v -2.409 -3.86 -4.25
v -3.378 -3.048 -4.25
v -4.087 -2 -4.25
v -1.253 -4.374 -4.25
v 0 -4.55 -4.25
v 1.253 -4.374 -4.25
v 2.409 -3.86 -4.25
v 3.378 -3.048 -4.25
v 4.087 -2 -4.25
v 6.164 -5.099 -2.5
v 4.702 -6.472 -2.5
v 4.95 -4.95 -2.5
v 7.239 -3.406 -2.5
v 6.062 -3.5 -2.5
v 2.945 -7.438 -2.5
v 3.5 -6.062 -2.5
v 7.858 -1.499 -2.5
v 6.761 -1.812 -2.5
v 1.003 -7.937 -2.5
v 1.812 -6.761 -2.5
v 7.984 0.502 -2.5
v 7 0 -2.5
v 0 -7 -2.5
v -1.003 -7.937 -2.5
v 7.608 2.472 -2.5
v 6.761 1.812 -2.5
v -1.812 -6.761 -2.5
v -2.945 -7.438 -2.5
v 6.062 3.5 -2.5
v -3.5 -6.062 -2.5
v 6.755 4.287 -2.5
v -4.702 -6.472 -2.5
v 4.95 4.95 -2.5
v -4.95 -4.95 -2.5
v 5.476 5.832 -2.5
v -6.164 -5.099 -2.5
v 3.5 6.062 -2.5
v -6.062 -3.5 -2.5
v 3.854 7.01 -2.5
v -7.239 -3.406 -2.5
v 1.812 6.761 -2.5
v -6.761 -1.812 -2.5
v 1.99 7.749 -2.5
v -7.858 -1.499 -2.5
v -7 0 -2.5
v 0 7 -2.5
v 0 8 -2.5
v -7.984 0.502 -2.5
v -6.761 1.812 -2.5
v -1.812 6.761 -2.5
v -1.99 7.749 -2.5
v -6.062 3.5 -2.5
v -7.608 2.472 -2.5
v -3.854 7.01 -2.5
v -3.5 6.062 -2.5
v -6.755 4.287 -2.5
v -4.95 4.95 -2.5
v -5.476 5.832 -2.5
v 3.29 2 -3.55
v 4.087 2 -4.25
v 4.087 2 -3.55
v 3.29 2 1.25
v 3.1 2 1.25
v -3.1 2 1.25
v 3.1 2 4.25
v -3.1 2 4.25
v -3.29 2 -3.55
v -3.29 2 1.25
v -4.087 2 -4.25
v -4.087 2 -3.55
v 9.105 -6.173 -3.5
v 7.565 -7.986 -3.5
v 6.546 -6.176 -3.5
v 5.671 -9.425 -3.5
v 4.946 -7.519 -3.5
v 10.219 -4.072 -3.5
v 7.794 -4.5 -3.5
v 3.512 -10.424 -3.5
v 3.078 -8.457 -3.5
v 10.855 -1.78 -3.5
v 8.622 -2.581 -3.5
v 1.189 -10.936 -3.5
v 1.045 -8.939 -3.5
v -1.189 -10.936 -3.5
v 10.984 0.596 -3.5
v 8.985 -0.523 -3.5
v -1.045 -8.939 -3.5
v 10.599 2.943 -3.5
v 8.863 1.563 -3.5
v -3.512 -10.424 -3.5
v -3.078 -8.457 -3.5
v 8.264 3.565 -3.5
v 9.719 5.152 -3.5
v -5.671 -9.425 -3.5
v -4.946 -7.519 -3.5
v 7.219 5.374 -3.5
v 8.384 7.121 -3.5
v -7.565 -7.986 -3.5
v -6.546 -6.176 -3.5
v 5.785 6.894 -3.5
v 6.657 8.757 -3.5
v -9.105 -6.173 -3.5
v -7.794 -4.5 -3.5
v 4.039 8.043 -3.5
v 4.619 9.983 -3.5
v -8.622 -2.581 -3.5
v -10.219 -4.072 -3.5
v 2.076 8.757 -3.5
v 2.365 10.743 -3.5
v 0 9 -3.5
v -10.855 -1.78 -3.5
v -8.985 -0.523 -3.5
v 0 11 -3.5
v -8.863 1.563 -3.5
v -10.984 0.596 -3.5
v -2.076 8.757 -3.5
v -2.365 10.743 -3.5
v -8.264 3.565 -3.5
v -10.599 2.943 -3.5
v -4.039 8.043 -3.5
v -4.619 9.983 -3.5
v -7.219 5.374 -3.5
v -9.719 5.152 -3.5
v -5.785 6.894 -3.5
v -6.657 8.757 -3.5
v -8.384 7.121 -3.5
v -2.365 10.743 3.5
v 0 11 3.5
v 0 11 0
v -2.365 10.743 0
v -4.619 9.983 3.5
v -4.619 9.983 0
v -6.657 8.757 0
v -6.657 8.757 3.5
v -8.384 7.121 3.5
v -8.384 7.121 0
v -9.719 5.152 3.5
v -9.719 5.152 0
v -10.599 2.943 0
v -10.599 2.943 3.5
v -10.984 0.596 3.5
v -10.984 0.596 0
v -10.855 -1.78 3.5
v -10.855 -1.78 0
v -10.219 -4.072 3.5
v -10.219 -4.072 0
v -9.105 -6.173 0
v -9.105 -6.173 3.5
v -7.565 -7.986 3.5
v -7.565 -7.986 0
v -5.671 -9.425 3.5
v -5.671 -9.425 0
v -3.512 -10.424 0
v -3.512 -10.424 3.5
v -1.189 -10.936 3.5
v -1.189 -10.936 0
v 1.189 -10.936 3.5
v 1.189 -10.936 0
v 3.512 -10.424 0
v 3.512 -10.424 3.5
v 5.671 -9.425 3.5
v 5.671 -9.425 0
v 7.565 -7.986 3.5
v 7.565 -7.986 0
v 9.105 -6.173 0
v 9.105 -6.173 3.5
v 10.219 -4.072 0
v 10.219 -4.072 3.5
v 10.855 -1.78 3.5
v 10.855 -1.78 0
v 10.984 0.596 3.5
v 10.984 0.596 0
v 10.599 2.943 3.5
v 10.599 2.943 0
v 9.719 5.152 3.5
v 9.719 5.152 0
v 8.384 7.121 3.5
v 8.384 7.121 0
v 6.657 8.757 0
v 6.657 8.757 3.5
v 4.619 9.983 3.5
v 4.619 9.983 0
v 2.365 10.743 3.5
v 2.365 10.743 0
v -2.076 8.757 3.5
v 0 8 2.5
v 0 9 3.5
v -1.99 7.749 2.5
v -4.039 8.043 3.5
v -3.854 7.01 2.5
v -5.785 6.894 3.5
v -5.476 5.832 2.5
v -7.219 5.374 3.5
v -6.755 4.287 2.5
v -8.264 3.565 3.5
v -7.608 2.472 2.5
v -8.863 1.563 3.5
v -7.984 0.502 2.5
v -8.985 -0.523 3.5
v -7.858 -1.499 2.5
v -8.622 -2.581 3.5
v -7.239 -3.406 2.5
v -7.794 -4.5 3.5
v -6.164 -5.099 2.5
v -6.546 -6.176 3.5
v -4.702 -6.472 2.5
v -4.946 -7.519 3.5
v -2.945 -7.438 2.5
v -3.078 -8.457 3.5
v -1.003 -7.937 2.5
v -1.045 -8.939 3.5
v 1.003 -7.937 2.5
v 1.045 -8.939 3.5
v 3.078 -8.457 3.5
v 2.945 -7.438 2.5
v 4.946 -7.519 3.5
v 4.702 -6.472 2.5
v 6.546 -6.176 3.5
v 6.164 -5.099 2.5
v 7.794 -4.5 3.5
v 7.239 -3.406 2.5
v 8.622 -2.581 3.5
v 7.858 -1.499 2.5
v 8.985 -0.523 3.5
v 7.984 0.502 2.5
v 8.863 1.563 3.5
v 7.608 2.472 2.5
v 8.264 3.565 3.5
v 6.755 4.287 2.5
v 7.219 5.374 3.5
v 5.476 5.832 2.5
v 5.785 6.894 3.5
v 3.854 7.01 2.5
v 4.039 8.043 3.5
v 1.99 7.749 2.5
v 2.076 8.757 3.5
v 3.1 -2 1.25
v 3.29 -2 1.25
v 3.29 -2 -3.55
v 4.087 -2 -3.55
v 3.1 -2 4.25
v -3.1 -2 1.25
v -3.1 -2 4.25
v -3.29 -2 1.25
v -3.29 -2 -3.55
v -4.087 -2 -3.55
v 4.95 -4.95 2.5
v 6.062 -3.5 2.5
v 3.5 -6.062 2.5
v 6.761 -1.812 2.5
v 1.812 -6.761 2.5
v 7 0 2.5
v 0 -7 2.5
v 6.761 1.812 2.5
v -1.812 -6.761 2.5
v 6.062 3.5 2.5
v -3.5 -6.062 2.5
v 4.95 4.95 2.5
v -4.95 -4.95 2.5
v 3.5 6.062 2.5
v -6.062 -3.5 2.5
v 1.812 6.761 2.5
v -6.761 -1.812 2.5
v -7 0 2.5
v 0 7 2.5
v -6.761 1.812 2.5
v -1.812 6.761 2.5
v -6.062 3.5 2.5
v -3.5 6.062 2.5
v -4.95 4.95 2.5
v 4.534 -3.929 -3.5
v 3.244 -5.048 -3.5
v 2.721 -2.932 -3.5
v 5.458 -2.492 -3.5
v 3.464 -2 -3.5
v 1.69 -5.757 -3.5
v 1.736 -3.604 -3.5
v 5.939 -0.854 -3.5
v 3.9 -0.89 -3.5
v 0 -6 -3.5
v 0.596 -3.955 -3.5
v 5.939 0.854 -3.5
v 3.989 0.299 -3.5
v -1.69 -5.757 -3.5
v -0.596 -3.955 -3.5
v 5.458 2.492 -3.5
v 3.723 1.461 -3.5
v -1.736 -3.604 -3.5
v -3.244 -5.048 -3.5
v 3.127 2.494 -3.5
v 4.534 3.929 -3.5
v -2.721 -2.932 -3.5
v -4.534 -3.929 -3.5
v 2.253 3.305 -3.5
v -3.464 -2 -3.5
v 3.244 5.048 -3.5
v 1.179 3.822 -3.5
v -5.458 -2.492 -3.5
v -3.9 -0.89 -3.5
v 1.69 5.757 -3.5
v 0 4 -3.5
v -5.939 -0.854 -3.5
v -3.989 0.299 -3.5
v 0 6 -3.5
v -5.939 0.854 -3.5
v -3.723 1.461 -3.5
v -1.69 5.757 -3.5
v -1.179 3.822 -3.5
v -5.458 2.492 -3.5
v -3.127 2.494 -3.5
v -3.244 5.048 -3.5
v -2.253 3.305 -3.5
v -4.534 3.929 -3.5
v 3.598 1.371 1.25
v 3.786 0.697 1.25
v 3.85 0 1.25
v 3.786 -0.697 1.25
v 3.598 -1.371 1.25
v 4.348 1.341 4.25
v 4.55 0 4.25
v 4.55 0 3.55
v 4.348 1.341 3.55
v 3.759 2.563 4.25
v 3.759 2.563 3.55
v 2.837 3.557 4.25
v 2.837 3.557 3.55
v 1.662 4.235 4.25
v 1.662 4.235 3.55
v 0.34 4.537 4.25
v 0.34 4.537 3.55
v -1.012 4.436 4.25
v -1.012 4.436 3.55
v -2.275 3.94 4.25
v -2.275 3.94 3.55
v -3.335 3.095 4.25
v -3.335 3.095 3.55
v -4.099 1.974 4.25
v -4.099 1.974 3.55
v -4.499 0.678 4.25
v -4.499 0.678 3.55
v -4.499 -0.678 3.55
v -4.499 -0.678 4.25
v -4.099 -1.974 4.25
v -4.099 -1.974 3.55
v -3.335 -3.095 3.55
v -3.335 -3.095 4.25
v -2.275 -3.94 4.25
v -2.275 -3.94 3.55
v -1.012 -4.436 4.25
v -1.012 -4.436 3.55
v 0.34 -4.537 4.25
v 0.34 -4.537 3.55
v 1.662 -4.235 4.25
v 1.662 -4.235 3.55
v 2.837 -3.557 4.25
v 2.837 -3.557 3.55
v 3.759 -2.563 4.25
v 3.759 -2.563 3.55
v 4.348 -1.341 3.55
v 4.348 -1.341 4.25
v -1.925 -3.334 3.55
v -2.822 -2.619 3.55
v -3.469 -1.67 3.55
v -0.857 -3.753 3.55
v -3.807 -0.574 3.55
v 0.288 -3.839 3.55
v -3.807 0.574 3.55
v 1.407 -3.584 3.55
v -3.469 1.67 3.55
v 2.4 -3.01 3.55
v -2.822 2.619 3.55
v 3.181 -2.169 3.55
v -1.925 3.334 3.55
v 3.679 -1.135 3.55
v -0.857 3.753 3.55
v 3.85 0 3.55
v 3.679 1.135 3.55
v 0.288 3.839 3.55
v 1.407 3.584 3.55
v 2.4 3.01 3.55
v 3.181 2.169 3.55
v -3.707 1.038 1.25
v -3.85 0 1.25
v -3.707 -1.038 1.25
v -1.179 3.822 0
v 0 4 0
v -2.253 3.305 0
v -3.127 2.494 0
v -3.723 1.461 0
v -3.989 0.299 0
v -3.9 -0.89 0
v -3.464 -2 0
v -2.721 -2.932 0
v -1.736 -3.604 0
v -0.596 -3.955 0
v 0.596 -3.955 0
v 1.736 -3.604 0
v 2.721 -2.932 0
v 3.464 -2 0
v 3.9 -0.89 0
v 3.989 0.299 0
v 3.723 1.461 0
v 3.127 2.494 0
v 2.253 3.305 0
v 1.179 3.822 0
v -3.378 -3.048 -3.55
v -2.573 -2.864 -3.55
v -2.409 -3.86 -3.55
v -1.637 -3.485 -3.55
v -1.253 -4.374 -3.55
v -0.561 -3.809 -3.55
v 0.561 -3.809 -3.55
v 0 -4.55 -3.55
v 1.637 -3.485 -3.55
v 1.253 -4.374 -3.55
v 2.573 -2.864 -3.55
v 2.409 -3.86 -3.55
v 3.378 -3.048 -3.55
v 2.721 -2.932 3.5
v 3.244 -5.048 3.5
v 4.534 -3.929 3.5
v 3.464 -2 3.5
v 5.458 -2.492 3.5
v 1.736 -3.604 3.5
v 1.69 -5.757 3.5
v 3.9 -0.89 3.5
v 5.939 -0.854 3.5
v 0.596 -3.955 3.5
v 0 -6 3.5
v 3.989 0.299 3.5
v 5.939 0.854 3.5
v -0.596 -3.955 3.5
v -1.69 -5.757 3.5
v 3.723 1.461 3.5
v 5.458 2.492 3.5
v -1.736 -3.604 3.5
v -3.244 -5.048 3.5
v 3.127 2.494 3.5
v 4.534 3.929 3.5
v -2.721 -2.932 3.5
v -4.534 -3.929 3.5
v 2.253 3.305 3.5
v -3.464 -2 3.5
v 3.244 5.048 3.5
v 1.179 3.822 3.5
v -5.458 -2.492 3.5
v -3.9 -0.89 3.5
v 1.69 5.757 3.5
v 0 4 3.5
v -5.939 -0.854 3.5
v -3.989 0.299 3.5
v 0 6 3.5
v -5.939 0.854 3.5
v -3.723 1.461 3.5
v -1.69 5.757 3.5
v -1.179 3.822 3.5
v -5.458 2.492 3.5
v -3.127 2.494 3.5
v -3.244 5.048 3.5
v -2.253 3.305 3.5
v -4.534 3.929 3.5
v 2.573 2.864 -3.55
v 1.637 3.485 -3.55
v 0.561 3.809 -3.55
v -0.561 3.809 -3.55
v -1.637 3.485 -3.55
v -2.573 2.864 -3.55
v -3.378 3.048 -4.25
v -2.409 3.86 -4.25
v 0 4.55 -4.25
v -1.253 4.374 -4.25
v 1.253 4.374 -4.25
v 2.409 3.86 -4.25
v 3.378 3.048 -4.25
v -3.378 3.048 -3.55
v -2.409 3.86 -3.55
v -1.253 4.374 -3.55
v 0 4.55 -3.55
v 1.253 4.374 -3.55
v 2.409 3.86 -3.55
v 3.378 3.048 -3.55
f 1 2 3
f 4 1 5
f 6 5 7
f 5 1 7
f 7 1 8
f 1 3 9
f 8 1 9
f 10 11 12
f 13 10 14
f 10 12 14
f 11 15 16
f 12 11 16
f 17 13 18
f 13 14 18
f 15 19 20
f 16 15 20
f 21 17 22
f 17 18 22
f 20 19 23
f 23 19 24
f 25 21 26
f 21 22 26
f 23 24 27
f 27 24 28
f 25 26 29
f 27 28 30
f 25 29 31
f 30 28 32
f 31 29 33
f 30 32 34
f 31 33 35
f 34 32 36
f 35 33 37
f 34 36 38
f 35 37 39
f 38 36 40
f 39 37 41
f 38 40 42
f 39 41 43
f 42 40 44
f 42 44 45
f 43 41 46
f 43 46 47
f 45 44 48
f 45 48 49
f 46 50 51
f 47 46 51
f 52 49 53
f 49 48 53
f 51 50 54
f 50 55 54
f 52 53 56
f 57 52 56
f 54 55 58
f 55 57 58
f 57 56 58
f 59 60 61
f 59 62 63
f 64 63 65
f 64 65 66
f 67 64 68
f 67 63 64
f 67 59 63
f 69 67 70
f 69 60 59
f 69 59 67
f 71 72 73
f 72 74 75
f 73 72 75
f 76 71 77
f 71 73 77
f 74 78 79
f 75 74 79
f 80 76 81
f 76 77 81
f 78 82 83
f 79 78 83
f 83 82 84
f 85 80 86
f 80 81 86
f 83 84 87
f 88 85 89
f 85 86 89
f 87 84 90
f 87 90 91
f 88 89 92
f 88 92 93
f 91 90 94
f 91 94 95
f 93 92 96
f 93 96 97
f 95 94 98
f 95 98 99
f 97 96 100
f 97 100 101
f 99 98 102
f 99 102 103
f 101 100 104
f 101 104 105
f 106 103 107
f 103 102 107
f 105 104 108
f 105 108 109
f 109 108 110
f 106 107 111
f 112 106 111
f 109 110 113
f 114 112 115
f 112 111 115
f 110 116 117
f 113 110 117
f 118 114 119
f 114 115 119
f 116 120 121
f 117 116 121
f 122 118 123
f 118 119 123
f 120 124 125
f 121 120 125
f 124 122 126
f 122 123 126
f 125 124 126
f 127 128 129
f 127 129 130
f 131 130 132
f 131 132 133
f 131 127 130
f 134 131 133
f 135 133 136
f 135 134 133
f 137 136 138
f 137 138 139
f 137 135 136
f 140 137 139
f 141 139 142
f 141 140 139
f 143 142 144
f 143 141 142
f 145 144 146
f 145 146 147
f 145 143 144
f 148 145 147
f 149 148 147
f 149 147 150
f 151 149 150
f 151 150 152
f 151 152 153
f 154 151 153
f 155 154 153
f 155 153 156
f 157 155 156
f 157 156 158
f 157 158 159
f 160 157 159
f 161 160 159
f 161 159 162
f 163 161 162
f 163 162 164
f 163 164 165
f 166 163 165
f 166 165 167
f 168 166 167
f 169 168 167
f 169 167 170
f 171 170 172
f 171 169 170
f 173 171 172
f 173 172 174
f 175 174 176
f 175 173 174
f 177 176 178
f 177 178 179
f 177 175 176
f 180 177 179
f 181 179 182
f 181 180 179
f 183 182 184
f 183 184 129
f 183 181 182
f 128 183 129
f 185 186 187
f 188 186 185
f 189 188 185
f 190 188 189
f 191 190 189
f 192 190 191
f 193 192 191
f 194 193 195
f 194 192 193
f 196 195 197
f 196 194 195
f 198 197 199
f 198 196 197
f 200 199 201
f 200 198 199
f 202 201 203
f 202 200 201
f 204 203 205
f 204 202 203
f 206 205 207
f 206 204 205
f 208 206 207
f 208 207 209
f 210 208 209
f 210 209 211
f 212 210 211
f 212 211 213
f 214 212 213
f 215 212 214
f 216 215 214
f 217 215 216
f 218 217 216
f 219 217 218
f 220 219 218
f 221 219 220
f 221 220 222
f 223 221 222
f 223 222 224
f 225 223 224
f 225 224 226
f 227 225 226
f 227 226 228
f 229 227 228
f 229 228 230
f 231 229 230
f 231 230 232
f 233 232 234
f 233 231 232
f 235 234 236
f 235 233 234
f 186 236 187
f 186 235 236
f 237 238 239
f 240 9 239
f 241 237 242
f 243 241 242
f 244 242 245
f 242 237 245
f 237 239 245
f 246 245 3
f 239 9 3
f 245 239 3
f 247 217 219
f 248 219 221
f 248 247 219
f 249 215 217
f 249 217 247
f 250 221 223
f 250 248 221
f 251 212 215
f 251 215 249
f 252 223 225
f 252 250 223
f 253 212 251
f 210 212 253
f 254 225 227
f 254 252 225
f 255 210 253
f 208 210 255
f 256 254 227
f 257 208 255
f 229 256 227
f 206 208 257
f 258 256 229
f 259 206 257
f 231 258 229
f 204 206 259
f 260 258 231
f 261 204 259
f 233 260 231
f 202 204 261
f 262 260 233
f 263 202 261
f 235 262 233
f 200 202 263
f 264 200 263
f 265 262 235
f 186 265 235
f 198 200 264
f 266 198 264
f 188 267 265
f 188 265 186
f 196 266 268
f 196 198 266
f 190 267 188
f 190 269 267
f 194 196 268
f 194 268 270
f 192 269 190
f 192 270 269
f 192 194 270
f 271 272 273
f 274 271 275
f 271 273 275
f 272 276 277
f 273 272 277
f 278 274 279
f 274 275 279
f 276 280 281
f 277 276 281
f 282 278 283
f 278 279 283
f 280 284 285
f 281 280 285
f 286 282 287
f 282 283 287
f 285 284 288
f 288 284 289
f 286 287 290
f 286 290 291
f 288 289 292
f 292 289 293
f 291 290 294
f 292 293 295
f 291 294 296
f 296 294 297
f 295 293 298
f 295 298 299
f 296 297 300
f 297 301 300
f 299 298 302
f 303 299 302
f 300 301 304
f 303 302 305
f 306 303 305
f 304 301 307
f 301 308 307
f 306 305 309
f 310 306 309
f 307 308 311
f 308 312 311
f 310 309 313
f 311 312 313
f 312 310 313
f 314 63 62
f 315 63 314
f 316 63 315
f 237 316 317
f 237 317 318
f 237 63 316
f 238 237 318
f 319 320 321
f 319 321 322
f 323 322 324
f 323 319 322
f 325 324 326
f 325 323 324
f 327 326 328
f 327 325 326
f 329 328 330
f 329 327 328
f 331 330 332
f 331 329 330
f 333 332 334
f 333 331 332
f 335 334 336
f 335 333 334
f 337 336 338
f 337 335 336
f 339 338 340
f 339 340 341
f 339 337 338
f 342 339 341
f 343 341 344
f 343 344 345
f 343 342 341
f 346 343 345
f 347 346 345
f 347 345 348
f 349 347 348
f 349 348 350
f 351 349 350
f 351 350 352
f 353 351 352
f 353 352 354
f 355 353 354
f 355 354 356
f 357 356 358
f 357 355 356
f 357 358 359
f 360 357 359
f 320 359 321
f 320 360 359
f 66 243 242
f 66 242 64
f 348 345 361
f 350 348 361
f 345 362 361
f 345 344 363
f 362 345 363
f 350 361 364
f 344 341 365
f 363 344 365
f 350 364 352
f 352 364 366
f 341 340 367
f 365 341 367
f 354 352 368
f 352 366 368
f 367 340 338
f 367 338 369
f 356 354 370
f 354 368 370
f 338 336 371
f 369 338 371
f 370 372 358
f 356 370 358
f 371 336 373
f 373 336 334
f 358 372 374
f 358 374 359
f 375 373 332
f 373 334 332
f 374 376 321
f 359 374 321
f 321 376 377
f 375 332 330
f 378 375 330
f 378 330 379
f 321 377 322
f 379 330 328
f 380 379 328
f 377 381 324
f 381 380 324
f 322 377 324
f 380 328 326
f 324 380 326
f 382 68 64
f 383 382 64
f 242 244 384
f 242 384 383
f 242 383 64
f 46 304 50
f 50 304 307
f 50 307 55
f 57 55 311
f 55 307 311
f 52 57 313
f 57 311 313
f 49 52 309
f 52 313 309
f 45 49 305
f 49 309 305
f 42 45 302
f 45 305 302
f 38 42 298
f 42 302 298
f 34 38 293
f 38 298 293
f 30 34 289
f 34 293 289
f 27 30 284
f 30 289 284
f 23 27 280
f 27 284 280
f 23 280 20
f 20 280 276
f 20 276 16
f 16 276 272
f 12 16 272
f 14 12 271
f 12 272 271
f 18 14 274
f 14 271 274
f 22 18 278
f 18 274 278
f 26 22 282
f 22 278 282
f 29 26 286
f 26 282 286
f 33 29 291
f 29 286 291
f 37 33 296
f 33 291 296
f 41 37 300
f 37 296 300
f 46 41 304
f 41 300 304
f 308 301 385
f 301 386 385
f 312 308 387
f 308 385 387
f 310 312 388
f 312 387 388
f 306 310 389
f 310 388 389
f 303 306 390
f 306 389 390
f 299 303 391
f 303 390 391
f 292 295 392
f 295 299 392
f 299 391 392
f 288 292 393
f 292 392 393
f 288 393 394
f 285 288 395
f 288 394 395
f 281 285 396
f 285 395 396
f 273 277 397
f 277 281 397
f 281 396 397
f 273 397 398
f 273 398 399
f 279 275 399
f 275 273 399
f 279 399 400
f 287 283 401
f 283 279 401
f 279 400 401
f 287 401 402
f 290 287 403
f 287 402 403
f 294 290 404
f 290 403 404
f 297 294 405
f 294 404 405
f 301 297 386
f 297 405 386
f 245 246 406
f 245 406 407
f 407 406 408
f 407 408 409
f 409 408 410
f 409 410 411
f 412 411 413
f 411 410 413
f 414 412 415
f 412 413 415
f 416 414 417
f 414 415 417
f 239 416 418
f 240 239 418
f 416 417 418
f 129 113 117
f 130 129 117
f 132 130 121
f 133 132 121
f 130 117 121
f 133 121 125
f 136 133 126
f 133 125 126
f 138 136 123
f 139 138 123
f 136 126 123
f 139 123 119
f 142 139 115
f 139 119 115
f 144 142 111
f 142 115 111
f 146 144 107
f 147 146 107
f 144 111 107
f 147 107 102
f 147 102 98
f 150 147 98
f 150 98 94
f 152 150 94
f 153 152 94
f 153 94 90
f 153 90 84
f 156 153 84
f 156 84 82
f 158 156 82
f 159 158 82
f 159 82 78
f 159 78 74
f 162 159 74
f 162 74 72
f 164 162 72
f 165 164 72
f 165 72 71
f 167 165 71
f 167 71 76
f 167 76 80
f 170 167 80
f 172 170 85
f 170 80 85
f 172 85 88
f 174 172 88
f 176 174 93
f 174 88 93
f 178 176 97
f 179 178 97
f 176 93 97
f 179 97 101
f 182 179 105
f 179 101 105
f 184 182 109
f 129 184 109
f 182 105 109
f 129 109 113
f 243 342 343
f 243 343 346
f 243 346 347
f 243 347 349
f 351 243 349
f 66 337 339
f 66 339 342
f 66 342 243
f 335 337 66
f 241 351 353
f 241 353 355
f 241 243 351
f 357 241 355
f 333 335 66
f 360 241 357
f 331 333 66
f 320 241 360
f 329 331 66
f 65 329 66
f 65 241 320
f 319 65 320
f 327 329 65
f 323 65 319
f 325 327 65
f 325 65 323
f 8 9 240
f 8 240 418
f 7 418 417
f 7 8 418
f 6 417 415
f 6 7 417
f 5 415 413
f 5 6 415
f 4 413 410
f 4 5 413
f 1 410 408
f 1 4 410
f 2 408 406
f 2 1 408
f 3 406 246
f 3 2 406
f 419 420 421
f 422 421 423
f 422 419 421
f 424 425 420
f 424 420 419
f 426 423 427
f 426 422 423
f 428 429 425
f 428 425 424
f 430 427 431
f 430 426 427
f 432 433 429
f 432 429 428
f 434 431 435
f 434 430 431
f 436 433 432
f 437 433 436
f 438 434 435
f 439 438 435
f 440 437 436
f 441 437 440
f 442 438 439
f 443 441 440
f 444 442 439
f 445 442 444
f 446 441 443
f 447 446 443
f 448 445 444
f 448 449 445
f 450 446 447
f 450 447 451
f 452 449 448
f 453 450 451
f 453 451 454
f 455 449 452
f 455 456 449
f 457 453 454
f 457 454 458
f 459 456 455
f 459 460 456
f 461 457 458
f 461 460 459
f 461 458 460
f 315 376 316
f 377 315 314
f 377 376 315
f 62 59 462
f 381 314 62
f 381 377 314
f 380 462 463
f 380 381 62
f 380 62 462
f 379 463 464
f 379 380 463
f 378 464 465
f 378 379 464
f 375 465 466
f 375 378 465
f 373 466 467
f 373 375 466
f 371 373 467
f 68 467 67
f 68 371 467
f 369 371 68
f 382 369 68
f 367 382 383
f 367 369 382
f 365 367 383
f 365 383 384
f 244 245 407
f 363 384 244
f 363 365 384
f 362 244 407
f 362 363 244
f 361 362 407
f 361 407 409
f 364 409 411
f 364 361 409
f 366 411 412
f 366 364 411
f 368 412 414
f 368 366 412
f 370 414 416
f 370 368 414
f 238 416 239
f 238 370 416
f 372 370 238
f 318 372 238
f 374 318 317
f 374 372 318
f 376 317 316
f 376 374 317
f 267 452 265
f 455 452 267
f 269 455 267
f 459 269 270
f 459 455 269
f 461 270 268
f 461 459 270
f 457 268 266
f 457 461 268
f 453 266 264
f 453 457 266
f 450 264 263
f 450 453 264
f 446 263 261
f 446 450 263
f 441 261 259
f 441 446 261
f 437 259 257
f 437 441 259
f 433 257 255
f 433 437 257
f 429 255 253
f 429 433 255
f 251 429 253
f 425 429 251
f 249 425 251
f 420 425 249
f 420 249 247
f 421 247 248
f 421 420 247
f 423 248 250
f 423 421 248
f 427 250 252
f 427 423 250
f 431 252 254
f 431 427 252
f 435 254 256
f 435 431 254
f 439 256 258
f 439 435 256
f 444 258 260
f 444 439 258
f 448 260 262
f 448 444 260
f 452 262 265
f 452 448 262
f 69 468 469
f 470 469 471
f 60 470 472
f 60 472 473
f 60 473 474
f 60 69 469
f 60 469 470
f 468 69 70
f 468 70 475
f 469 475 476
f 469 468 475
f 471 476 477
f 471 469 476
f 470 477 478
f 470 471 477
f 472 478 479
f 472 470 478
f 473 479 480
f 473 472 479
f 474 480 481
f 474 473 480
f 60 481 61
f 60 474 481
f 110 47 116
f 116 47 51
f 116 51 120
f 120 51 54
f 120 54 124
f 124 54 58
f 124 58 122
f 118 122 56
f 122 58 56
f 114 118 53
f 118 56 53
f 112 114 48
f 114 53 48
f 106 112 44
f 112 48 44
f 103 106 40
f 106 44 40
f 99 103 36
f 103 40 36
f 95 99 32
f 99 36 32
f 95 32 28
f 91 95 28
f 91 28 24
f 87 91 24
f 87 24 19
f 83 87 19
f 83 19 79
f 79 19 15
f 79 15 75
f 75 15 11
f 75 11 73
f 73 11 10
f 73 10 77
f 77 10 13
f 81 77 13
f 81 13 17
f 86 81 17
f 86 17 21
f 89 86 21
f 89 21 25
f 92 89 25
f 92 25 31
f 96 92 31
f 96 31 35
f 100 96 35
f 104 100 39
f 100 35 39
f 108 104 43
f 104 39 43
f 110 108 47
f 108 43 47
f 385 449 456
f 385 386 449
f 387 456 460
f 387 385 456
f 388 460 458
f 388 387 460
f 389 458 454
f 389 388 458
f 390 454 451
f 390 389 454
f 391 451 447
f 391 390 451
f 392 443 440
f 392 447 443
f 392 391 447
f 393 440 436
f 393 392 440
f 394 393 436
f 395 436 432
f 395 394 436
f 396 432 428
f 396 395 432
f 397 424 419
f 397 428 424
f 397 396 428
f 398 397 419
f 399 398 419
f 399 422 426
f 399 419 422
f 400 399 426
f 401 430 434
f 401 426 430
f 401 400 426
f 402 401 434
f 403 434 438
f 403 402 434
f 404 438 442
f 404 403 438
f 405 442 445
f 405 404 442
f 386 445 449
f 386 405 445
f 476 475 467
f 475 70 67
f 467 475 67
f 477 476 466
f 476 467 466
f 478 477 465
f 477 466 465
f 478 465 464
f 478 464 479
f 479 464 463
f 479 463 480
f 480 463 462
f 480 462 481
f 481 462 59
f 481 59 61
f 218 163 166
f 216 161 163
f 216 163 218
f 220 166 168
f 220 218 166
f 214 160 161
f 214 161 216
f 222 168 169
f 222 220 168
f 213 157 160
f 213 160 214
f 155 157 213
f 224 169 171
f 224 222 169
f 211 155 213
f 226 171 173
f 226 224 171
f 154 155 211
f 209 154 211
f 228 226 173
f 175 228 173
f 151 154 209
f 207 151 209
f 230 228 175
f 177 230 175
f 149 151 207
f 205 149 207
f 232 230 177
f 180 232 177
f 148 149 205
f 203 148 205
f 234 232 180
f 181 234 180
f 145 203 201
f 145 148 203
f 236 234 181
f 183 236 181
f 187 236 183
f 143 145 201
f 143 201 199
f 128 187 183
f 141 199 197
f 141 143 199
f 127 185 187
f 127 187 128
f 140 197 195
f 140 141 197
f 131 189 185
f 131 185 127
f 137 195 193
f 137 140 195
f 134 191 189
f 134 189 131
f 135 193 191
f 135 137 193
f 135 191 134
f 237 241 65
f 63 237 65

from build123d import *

# Parameters (mm, degrees)
F4_R      = 3.85
F4_W      = 6.2
F4_H      = 4
F9_DEPTH  = 4.25
F11_DEPTH = 5.5
F13_DEPTH = 0.7
F14_R     = 4.55
F14_R_2   = 3.85
F15_DEPTH = 0.7


# Not quite as in the source:
# - a feature of the source that left no trace in its solid (it failed there, or was rolled back) is left out


with BuildPart() as f2:
    # F1 (on Right) → F2 (revolve)
    with BuildSketch(Plane.YZ):
        Polygon((-11, 0), (-4, 0), (-4, 3.5), (-6, 3.5), (-7, 2.5), (-8, 2.5), (-9, 3.5), (-11, 3.5), align=None)
        Polygon((8, 2.5), (7, 2.5), (6, 3.5), (4, 3.5), (4, 0), (11, 0), (11, 3.5), (9, 3.5), align=None)
    revolve(axis=Axis((0, 0, 2.2127844859), (0, 0, 1)))


with BuildPart() as f3_1:
    # F3: instance of F2
    add(f2.part.mirror(Plane.XY))


with BuildPart() as f2_1:
    add(f2.part)

    # F8: F2 across plane
    add(f2.part.mirror(Plane.XY))


with BuildPart() as f9:
    # F4 (on Top) → F9 (new body, symmetric)
    with BuildSketch(Plane.XY):
        Circle(F4_R)
        Rectangle(F4_W, F4_H, mode=Mode.SUBTRACT)
    extrude(amount=F9_DEPTH, both=True)

    # F10 (on face) → F11 (cut)
    with BuildSketch(Plane(origin=(0, 0, -4.25), x_dir=(1, 0, 0), z_dir=(0, 0, -1))):
        with BuildLine():
            Line((-3.1, -2), (-3.1, 2))
            Line((-3.1, 2), (-3.2897568299, 2))
            ThreePointArc((-3.2897568299, 2), (-3.85, 0), (-3.2897568299, -2))
            Line((-3.2897568299, -2), (-3.1, -2))
        make_face()
        with BuildLine():
            Line((3.2897568299, 2), (3.1, 2))
            Line((3.1, 2), (3.1, -2))
            Line((3.1, -2), (3.2897568299, -2))
            ThreePointArc((3.2897568299, -2), (3.7072944174, -1.0384931884), (3.85, 0))
            ThreePointArc((3.85, 0), (3.7072944174, 1.0384931884), (3.2897568299, 2))
        make_face()
    extrude(amount=-F11_DEPTH, mode=Mode.SUBTRACT)

    # F12 (on face) → F13 (join)
    with BuildSketch(Plane(origin=(0, 0, -4.25), x_dir=(1, 0, 0), z_dir=(0, 0, -1))):
        with BuildLine():
            Line((-3.2897568299, -2), (-4.0868692174, -2))
            ThreePointArc((-4.0868692174, -2), (0, -4.55), (4.0868692174, -2))
            Line((4.0868692174, -2), (3.2897568299, -2))
            ThreePointArc((3.2897568299, -2), (0, -3.85), (-3.2897568299, -2))
        make_face()
        with BuildLine():
            ThreePointArc((4.0868692174, 2), (0, 4.55), (-4.0868692174, 2))
            Line((-4.0868692174, 2), (-3.2897568299, 2))
            ThreePointArc((-3.2897568299, 2), (0, 3.85), (3.2897568299, 2))
            Line((3.2897568299, 2), (4.0868692174, 2))
        make_face()
    extrude(amount=-F13_DEPTH)

    # F14 (on face) → F15 (join)
    with BuildSketch(Plane.XY.offset(4.25)):
        Circle(F14_R)
        Circle(F14_R_2, mode=Mode.SUBTRACT)
    extrude(amount=-F15_DEPTH)


solid = Compound([f2_1.part, f9.part])
